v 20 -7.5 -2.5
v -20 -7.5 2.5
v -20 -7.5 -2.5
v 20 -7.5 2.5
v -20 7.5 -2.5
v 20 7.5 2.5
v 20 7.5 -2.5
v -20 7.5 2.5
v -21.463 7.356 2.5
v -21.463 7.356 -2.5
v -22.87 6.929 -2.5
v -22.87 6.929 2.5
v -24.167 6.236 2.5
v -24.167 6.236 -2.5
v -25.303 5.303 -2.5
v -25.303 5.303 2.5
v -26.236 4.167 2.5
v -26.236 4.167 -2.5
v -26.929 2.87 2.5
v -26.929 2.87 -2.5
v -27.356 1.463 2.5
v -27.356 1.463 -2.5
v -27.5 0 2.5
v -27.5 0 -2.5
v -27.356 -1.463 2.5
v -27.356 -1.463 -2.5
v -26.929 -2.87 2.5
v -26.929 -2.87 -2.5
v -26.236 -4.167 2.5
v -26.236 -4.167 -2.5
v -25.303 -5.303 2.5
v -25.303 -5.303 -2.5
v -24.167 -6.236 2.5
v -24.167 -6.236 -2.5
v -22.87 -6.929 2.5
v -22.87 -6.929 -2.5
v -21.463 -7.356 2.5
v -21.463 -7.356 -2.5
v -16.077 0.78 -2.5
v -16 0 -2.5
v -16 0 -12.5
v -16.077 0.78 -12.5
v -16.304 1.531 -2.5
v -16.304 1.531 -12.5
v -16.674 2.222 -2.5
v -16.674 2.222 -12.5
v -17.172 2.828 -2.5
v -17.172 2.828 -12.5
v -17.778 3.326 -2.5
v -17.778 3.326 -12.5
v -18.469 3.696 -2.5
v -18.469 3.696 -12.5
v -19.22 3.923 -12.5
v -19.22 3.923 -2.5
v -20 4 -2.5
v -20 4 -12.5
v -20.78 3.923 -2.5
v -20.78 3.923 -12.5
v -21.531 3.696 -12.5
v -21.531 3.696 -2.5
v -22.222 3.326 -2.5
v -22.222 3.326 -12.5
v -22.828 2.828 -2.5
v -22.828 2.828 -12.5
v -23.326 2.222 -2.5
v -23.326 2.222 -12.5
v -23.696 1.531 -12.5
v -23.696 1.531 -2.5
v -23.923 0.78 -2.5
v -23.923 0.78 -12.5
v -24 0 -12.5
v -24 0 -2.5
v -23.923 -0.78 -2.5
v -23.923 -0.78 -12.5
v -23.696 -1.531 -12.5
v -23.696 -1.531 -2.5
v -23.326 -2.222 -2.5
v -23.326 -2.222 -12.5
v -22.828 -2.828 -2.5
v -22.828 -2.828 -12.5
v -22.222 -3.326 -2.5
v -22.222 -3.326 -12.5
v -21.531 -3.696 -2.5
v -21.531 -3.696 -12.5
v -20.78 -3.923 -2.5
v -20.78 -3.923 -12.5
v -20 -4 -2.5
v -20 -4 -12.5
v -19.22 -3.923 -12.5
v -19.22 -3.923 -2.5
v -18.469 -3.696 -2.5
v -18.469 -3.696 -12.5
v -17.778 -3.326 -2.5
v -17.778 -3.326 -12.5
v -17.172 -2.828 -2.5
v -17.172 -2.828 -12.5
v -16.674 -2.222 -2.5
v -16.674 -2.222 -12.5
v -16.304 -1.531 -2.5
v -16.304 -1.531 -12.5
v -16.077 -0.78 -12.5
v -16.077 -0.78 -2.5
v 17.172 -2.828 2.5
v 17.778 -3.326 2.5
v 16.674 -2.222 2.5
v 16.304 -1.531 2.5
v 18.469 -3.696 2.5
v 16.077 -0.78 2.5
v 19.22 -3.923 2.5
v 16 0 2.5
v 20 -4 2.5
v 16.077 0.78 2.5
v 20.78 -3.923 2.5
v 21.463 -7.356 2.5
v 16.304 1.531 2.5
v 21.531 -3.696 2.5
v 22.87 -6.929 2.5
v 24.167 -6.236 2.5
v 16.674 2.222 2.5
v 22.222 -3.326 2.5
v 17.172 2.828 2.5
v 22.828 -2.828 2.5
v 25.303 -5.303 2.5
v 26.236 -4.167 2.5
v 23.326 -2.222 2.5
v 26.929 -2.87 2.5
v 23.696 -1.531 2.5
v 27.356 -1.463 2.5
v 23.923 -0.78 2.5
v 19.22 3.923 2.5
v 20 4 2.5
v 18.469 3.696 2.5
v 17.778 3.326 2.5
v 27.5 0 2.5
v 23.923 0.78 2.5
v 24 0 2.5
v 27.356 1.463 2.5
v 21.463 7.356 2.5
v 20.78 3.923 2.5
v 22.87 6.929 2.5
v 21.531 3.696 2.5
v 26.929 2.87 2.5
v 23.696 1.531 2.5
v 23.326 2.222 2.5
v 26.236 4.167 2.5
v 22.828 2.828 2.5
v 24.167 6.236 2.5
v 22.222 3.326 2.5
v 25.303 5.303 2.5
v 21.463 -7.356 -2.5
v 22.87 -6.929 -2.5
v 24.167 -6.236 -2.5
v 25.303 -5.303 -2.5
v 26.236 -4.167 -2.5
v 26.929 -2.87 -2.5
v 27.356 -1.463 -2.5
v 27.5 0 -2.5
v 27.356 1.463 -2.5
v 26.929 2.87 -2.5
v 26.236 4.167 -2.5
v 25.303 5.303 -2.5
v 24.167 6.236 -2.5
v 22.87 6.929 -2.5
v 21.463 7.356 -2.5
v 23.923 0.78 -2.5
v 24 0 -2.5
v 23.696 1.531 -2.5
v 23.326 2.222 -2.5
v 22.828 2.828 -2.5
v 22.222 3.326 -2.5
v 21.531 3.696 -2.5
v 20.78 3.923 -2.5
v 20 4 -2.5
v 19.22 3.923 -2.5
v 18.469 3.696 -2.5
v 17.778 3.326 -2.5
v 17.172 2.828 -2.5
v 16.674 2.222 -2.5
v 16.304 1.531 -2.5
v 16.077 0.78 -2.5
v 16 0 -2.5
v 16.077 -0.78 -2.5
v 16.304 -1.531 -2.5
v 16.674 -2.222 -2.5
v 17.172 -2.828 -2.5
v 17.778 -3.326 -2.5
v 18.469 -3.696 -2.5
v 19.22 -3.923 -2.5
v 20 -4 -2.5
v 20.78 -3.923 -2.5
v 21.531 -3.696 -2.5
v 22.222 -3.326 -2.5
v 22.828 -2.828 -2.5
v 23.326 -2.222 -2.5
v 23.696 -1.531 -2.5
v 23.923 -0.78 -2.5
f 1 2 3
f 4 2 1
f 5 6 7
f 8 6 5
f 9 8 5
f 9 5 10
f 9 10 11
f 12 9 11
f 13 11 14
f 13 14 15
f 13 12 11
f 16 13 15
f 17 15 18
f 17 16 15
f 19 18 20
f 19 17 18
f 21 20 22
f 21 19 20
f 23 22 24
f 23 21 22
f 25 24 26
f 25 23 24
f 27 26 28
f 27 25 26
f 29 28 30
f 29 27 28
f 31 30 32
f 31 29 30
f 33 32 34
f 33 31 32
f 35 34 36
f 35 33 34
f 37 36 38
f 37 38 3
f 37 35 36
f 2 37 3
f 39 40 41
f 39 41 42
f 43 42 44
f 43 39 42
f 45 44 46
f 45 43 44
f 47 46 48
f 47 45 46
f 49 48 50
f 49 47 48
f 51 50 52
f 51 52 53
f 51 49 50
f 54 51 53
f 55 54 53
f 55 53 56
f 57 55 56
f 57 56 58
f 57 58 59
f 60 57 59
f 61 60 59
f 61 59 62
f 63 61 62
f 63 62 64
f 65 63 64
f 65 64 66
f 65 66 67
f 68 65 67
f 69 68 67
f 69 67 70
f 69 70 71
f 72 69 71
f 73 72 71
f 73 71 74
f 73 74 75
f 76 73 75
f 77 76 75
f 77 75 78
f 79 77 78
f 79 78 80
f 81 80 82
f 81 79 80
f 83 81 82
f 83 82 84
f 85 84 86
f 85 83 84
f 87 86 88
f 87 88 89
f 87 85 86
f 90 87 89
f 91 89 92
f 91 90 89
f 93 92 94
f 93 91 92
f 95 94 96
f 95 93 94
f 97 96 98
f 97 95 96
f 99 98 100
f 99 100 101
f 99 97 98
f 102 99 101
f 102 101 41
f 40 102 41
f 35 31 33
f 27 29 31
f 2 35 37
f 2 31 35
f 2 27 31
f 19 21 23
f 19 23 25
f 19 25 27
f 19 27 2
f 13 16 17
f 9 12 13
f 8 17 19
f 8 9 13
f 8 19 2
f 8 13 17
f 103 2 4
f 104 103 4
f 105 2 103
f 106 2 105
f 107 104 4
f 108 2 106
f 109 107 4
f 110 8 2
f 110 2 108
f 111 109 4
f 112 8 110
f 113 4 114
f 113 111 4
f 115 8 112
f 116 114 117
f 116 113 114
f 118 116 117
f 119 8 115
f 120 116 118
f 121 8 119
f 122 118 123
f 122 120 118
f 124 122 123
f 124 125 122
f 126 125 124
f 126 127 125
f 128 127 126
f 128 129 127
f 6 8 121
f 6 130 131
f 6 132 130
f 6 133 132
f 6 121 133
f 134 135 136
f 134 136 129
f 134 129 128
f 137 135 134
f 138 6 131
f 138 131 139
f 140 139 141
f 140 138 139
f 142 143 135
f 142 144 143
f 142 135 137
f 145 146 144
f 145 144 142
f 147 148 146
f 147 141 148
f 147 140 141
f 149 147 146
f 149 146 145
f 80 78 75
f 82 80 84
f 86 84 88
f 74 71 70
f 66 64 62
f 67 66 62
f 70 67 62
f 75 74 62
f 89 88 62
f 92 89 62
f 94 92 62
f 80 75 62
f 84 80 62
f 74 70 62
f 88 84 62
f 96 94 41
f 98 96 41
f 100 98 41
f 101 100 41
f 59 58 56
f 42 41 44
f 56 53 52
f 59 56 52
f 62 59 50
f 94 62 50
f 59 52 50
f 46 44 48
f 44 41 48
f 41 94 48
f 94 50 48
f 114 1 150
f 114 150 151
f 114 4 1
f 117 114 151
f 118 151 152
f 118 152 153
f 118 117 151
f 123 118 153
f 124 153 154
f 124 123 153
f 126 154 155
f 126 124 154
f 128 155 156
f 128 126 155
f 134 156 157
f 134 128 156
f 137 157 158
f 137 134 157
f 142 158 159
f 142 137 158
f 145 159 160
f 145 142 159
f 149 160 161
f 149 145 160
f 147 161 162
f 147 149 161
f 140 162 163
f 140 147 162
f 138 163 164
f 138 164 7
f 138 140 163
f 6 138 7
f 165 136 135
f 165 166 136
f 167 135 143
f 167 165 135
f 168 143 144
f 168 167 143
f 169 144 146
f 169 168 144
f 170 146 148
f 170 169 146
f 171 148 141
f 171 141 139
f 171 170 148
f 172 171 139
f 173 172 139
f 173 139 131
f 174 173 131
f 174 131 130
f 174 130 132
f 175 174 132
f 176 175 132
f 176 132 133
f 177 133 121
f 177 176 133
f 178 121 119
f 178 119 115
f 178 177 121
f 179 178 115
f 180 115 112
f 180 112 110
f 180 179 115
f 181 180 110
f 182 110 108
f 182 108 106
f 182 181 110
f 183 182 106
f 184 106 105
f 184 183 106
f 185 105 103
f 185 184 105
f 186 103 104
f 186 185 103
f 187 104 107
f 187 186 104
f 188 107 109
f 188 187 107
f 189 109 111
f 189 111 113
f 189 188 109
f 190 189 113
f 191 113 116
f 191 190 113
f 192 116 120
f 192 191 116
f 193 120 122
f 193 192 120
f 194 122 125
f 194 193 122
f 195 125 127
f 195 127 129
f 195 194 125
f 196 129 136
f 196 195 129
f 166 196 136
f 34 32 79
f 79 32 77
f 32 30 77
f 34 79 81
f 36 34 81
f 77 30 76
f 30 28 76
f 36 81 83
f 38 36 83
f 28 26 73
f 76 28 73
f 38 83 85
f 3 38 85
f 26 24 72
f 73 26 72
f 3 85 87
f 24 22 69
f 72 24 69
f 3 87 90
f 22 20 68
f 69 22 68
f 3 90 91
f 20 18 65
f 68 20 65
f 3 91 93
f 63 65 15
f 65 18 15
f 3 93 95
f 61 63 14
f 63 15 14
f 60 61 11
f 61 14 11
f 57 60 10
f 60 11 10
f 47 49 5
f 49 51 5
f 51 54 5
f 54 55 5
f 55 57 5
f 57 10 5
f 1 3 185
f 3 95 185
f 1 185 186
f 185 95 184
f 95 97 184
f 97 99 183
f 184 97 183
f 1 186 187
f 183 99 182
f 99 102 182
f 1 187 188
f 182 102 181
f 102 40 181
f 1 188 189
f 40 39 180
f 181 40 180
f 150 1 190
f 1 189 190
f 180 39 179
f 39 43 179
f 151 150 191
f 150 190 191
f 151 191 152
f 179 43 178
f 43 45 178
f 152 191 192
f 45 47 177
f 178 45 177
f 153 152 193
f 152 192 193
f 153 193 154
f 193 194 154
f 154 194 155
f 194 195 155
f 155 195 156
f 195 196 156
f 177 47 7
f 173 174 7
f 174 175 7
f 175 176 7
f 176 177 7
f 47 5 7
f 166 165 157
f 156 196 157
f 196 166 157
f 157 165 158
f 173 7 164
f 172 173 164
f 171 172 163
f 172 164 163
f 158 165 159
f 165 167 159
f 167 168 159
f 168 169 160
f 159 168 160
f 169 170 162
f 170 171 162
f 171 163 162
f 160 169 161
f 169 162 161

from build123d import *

# Parameters (mm, degrees)
F0_R     = 4
F1_DEPTH = 2.5
F2_R     = 4
F3_DEPTH = 15


with BuildPart() as f1:
    # F0 (on Top) → F1 (new body, symmetric)
    with BuildSketch(Plane.XY):
        with BuildLine():
            ThreePointArc((20, -7.5), (27.5, 0), (20, 7.5))
            Line((20, 7.5), (-20, 7.5))
            ThreePointArc((-20, 7.5), (-27.5, 0), (-20, -7.5))
            Line((-20, -7.5), (20, -7.5))
        make_face()
        with Locations((-20, 0)):
            Circle(F0_R, mode=Mode.SUBTRACT)
        with Locations((20, 0)):
            Circle(F0_R, mode=Mode.SUBTRACT)
    extrude(amount=F1_DEPTH, both=True)

    # F2 (on face) → F3 (join)
    with BuildSketch(Plane.XY.offset(2.5)):
        with Locations((-20, 0)):
            Circle(F2_R)
    extrude(amount=-F3_DEPTH)


solid = f1.part
